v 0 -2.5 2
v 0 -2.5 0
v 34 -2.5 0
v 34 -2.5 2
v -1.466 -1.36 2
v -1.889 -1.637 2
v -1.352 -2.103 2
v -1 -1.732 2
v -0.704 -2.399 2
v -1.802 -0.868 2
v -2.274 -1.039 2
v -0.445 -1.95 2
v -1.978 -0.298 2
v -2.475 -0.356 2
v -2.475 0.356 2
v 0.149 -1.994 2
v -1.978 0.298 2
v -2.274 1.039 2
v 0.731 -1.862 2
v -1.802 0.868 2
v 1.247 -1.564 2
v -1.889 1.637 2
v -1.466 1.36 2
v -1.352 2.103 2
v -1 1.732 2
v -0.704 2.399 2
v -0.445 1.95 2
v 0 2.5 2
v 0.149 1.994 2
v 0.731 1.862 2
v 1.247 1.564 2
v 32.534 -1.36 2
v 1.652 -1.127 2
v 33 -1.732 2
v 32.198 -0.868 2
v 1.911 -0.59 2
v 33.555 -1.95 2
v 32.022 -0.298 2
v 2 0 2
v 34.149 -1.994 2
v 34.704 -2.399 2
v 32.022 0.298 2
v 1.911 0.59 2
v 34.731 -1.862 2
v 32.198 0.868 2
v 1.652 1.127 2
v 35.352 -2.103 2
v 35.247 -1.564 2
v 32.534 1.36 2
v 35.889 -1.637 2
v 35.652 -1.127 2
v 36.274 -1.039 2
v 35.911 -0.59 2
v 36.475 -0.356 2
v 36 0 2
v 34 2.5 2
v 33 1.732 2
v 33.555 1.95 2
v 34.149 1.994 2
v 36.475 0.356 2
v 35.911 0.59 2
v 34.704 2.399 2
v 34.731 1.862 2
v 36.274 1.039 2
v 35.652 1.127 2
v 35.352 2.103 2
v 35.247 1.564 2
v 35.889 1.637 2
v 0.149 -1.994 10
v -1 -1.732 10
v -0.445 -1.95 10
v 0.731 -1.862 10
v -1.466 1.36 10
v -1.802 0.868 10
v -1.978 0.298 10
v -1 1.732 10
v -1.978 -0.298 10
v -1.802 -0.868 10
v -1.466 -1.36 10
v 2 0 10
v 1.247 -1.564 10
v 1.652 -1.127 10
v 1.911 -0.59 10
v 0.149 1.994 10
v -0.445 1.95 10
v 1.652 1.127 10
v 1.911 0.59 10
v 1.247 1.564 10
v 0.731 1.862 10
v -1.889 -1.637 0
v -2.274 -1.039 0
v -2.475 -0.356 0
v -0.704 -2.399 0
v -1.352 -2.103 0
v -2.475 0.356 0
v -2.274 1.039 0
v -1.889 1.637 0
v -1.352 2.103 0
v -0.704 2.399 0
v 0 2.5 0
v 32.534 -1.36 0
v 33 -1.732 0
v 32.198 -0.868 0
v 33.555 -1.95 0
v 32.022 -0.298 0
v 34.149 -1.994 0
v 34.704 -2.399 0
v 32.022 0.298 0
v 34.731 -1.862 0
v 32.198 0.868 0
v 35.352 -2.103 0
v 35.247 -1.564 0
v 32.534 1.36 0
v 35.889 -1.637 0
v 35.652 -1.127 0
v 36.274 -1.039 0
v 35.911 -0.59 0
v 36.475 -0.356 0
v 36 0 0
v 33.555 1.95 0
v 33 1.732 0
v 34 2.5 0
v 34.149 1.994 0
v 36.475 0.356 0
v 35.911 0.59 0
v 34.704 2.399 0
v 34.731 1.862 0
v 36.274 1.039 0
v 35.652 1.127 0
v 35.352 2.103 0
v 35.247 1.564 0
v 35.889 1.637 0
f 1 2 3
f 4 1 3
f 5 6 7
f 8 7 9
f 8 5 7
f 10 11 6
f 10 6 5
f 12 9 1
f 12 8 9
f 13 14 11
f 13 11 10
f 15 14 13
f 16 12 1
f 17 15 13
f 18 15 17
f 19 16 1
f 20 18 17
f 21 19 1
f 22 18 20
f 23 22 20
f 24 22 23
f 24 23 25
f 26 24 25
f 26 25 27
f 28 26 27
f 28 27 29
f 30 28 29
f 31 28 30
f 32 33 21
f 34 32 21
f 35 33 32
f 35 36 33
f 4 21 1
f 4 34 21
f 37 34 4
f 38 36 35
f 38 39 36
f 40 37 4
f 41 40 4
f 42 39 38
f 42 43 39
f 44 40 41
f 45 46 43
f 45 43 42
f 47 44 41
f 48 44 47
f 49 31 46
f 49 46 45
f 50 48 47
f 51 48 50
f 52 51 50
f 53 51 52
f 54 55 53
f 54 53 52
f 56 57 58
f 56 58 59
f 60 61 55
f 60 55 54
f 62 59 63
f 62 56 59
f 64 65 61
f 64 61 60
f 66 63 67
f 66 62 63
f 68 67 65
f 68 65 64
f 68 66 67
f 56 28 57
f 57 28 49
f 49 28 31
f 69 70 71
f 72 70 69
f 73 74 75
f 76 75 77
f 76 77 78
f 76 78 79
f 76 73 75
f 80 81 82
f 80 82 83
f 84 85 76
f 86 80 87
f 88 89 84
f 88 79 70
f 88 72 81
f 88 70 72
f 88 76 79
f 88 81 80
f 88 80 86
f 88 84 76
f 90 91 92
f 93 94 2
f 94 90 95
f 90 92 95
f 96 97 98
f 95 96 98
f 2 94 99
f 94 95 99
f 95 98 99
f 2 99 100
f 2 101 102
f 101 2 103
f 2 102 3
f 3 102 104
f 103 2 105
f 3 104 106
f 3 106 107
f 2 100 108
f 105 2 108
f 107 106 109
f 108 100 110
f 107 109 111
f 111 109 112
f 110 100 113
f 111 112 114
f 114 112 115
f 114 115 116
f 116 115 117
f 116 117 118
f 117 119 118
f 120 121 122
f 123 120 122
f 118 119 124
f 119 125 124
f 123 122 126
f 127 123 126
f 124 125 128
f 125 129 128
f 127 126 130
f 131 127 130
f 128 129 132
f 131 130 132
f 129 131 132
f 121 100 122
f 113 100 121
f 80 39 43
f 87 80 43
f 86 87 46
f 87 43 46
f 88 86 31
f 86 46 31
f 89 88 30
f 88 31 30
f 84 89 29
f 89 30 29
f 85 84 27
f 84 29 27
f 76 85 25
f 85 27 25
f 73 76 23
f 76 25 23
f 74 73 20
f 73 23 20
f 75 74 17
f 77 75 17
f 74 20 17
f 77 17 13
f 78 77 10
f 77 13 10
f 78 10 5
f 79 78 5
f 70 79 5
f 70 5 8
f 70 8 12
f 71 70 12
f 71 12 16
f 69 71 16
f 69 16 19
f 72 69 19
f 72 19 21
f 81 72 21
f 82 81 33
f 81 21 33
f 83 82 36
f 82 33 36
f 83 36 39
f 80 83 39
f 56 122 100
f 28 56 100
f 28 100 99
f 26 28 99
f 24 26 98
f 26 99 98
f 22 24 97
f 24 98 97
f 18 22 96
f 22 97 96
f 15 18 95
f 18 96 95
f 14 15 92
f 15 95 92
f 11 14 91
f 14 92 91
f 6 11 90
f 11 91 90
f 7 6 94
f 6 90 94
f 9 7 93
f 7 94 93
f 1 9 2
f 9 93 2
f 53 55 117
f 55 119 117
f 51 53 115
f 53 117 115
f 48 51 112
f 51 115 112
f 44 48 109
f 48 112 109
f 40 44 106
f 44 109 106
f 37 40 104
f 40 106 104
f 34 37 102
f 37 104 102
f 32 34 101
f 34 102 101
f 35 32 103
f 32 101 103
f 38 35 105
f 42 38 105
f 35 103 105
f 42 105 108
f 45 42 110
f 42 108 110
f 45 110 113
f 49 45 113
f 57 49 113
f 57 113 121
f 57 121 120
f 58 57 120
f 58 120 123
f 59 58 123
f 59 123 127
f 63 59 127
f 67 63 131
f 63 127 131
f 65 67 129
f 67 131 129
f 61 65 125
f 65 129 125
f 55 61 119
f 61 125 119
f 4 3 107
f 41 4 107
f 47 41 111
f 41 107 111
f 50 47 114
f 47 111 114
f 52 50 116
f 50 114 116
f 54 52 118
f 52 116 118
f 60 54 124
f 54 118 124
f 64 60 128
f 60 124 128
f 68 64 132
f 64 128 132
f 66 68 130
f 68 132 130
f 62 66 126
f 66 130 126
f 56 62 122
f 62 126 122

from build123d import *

# Parameters (mm, degrees)
BOSS_EXTRUDE1_DEPTH = 2
SKETCH2_R           = 2
BOSS_EXTRUDE2_DEPTH = 8
SKETCH5_R           = 2
CUT_EXTRUDE2_DEPTH  = 4


with BuildPart() as part:
    # Sketch1 → Boss-Extrude1 (new body)
    with BuildSketch(Plane.XY):
        with BuildLine():
            Line((0, -2.5), (34, -2.5))
            ThreePointArc((34, -2.5), (36.5, 0), (34, 2.5))
            Line((34, 2.5), (0, 2.5))
            ThreePointArc((0, 2.5), (-2.5, 0), (0, -2.5))
        make_face()
    extrude(amount=BOSS_EXTRUDE1_DEPTH)

    # Sketch2 → Boss-Extrude2 (add)
    with BuildSketch(Plane.XY.offset(2)):
        Circle(SKETCH2_R)
    extrude(amount=BOSS_EXTRUDE2_DEPTH)

    # Sketch5 → Cut-Extrude2 (cut, symmetric)
    with BuildSketch(Plane(origin=(0, 0, 0), x_dir=(-1, 0, 0), z_dir=(0, 0, -1))):
        with Locations(Location((-34, 0, 0), (0, 0, 180))):
            Circle(SKETCH5_R)
    extrude(amount=CUT_EXTRUDE2_DEPTH, both=True, mode=Mode.SUBTRACT)


solid = part.part
